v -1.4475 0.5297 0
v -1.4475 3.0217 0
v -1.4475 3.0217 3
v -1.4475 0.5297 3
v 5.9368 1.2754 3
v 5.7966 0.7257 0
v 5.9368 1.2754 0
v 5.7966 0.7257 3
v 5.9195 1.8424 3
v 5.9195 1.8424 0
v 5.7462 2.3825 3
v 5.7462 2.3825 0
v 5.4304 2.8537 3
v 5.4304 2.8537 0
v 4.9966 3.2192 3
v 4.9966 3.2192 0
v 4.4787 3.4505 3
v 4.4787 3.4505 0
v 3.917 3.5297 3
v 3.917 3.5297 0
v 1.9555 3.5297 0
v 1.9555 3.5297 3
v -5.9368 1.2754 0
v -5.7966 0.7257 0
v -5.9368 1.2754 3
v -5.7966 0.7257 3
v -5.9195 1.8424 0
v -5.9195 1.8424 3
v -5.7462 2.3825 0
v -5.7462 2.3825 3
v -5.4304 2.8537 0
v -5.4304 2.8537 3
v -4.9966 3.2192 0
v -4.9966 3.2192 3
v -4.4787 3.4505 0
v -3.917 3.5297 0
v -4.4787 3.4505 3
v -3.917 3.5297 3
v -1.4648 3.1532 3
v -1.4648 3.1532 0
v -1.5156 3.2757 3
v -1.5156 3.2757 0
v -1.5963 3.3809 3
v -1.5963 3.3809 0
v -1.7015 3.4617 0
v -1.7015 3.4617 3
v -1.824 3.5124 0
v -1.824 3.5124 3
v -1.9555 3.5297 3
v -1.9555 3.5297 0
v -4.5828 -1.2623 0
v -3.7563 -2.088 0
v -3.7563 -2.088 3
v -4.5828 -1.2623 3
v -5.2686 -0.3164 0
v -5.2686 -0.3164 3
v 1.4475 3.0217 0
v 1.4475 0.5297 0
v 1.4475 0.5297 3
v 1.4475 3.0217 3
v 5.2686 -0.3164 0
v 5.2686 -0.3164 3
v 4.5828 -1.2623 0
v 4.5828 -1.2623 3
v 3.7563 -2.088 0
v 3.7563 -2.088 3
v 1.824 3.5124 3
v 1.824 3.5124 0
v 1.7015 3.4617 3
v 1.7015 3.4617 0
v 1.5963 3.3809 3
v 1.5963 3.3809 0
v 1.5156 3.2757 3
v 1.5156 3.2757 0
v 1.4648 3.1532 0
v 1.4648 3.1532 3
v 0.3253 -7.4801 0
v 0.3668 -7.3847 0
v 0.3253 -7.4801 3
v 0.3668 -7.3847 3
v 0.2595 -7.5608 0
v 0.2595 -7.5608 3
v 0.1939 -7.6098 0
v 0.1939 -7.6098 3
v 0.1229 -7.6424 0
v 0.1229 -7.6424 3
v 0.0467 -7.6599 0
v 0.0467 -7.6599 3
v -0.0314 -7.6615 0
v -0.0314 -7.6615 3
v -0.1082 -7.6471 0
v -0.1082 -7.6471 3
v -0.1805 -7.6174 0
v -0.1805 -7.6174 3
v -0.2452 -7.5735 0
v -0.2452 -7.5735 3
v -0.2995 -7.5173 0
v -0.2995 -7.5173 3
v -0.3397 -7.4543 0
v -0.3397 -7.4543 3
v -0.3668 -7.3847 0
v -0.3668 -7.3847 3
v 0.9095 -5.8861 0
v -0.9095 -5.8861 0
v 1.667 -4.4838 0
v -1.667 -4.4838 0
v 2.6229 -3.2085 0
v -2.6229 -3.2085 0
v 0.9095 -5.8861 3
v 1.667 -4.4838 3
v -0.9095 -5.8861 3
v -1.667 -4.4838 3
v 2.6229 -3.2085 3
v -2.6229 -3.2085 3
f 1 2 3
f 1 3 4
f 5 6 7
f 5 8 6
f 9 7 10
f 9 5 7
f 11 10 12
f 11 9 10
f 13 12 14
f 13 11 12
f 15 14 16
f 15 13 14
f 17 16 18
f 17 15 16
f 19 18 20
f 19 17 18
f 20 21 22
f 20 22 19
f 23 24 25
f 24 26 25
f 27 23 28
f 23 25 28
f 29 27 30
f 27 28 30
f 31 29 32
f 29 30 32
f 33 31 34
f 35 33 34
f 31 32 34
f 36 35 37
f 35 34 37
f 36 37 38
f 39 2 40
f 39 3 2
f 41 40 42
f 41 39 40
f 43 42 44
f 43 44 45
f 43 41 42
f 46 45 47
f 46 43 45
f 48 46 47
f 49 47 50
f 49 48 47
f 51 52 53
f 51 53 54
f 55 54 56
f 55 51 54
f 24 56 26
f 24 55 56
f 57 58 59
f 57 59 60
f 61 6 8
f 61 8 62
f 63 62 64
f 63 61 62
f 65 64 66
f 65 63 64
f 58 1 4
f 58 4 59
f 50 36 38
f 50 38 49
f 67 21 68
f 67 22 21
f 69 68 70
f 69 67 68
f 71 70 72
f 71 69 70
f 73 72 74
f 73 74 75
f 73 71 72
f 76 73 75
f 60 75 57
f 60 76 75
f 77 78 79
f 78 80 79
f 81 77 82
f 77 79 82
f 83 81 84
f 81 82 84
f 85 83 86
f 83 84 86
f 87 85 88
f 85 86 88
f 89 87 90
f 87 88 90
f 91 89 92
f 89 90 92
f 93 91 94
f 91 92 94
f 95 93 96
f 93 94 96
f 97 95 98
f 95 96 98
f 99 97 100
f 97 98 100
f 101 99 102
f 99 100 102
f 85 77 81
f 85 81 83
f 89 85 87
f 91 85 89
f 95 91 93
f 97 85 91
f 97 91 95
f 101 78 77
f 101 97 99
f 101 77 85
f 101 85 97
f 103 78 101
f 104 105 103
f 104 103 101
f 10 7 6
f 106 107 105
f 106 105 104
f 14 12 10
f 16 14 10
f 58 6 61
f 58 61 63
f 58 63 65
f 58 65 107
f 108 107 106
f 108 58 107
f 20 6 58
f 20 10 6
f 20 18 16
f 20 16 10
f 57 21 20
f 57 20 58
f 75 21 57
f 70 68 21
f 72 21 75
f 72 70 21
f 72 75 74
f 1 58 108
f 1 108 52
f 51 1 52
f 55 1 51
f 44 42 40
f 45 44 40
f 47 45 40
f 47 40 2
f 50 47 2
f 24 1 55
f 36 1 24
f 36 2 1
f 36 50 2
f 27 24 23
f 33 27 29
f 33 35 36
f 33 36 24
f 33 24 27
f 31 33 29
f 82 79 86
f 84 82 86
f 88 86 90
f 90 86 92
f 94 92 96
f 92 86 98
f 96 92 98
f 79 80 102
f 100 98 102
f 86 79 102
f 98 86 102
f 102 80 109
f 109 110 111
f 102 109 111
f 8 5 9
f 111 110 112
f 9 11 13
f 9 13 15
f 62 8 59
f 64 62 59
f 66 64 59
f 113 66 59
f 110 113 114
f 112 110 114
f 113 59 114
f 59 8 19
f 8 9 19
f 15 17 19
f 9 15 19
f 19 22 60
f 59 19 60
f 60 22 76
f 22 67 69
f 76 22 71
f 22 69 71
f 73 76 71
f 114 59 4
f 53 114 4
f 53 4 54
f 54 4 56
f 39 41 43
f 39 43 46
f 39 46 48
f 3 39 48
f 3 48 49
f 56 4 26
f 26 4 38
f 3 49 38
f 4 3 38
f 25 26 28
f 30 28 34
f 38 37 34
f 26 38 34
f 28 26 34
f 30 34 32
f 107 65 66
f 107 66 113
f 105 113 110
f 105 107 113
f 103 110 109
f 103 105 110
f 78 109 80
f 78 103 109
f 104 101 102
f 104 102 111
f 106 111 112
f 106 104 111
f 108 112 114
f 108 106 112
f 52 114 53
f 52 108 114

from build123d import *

# Parameters (mm, degrees)
EXTRUDE_1_DEPTH = 3
FILLET_1_R      = 0.381
FILLET_2_R      = 2.032
FILLET_3_R      = 0.508


with BuildPart() as part:
    # 스케치1 → 보스-돌출1 (new body)
    with BuildSketch(Plane.XY):
        with BuildLine():
            ThreePointArc((6.35, 3.529721173), (5.670280833, 0.435941066), (3.756321038, -2.08799463))
            ThreePointArc((3.756321038, -2.08799463), (1.146216202, -5.391882357), (0, -9.443364775))
            ThreePointArc((0, -9.443364775), (-1.146216202, -5.391882357), (-3.756321038, -2.08799463))
            ThreePointArc((-3.756321038, -2.08799463), (-5.670280833, 0.435941066), (-6.35, 3.529721173))
            Line((-6.35, 3.529721173), (-1.4475, 3.529721173))
            Line((-1.4475, 3.529721173), (-1.4475, 0.529721173))
            Line((-1.4475, 0.529721173), (1.4475, 0.529721173))
            Line((1.4475, 0.529721173), (1.4475, 3.529721173))
            Line((1.4475, 3.529721173), (6.35, 3.529721173))
        make_face()
    extrude(amount=EXTRUDE_1_DEPTH)

    # 필렛1
    fillet_1_edges = [part.edges().sort_by_distance(p)[0] for p in [
        (0, -9.443364775, 1.5),
    ]]
    fillet(fillet_1_edges, radius=FILLET_1_R)

    # 필렛2
    fillet_2_edges = [part.edges().sort_by_distance(p)[0] for p in [
        (-6.35, 3.529721173, 1.5),
        (6.35, 3.529721173, 1.5),
    ]]
    fillet(fillet_2_edges, radius=FILLET_2_R)

    # 필렛3
    fillet_3_edges = [part.edges().sort_by_distance(p)[0] for p in [
        (-1.4475, 3.529721173, 1.5),
        (1.4475, 3.529721173, 1.5),
    ]]
    fillet(fillet_3_edges, radius=FILLET_3_R)


solid = part.part
